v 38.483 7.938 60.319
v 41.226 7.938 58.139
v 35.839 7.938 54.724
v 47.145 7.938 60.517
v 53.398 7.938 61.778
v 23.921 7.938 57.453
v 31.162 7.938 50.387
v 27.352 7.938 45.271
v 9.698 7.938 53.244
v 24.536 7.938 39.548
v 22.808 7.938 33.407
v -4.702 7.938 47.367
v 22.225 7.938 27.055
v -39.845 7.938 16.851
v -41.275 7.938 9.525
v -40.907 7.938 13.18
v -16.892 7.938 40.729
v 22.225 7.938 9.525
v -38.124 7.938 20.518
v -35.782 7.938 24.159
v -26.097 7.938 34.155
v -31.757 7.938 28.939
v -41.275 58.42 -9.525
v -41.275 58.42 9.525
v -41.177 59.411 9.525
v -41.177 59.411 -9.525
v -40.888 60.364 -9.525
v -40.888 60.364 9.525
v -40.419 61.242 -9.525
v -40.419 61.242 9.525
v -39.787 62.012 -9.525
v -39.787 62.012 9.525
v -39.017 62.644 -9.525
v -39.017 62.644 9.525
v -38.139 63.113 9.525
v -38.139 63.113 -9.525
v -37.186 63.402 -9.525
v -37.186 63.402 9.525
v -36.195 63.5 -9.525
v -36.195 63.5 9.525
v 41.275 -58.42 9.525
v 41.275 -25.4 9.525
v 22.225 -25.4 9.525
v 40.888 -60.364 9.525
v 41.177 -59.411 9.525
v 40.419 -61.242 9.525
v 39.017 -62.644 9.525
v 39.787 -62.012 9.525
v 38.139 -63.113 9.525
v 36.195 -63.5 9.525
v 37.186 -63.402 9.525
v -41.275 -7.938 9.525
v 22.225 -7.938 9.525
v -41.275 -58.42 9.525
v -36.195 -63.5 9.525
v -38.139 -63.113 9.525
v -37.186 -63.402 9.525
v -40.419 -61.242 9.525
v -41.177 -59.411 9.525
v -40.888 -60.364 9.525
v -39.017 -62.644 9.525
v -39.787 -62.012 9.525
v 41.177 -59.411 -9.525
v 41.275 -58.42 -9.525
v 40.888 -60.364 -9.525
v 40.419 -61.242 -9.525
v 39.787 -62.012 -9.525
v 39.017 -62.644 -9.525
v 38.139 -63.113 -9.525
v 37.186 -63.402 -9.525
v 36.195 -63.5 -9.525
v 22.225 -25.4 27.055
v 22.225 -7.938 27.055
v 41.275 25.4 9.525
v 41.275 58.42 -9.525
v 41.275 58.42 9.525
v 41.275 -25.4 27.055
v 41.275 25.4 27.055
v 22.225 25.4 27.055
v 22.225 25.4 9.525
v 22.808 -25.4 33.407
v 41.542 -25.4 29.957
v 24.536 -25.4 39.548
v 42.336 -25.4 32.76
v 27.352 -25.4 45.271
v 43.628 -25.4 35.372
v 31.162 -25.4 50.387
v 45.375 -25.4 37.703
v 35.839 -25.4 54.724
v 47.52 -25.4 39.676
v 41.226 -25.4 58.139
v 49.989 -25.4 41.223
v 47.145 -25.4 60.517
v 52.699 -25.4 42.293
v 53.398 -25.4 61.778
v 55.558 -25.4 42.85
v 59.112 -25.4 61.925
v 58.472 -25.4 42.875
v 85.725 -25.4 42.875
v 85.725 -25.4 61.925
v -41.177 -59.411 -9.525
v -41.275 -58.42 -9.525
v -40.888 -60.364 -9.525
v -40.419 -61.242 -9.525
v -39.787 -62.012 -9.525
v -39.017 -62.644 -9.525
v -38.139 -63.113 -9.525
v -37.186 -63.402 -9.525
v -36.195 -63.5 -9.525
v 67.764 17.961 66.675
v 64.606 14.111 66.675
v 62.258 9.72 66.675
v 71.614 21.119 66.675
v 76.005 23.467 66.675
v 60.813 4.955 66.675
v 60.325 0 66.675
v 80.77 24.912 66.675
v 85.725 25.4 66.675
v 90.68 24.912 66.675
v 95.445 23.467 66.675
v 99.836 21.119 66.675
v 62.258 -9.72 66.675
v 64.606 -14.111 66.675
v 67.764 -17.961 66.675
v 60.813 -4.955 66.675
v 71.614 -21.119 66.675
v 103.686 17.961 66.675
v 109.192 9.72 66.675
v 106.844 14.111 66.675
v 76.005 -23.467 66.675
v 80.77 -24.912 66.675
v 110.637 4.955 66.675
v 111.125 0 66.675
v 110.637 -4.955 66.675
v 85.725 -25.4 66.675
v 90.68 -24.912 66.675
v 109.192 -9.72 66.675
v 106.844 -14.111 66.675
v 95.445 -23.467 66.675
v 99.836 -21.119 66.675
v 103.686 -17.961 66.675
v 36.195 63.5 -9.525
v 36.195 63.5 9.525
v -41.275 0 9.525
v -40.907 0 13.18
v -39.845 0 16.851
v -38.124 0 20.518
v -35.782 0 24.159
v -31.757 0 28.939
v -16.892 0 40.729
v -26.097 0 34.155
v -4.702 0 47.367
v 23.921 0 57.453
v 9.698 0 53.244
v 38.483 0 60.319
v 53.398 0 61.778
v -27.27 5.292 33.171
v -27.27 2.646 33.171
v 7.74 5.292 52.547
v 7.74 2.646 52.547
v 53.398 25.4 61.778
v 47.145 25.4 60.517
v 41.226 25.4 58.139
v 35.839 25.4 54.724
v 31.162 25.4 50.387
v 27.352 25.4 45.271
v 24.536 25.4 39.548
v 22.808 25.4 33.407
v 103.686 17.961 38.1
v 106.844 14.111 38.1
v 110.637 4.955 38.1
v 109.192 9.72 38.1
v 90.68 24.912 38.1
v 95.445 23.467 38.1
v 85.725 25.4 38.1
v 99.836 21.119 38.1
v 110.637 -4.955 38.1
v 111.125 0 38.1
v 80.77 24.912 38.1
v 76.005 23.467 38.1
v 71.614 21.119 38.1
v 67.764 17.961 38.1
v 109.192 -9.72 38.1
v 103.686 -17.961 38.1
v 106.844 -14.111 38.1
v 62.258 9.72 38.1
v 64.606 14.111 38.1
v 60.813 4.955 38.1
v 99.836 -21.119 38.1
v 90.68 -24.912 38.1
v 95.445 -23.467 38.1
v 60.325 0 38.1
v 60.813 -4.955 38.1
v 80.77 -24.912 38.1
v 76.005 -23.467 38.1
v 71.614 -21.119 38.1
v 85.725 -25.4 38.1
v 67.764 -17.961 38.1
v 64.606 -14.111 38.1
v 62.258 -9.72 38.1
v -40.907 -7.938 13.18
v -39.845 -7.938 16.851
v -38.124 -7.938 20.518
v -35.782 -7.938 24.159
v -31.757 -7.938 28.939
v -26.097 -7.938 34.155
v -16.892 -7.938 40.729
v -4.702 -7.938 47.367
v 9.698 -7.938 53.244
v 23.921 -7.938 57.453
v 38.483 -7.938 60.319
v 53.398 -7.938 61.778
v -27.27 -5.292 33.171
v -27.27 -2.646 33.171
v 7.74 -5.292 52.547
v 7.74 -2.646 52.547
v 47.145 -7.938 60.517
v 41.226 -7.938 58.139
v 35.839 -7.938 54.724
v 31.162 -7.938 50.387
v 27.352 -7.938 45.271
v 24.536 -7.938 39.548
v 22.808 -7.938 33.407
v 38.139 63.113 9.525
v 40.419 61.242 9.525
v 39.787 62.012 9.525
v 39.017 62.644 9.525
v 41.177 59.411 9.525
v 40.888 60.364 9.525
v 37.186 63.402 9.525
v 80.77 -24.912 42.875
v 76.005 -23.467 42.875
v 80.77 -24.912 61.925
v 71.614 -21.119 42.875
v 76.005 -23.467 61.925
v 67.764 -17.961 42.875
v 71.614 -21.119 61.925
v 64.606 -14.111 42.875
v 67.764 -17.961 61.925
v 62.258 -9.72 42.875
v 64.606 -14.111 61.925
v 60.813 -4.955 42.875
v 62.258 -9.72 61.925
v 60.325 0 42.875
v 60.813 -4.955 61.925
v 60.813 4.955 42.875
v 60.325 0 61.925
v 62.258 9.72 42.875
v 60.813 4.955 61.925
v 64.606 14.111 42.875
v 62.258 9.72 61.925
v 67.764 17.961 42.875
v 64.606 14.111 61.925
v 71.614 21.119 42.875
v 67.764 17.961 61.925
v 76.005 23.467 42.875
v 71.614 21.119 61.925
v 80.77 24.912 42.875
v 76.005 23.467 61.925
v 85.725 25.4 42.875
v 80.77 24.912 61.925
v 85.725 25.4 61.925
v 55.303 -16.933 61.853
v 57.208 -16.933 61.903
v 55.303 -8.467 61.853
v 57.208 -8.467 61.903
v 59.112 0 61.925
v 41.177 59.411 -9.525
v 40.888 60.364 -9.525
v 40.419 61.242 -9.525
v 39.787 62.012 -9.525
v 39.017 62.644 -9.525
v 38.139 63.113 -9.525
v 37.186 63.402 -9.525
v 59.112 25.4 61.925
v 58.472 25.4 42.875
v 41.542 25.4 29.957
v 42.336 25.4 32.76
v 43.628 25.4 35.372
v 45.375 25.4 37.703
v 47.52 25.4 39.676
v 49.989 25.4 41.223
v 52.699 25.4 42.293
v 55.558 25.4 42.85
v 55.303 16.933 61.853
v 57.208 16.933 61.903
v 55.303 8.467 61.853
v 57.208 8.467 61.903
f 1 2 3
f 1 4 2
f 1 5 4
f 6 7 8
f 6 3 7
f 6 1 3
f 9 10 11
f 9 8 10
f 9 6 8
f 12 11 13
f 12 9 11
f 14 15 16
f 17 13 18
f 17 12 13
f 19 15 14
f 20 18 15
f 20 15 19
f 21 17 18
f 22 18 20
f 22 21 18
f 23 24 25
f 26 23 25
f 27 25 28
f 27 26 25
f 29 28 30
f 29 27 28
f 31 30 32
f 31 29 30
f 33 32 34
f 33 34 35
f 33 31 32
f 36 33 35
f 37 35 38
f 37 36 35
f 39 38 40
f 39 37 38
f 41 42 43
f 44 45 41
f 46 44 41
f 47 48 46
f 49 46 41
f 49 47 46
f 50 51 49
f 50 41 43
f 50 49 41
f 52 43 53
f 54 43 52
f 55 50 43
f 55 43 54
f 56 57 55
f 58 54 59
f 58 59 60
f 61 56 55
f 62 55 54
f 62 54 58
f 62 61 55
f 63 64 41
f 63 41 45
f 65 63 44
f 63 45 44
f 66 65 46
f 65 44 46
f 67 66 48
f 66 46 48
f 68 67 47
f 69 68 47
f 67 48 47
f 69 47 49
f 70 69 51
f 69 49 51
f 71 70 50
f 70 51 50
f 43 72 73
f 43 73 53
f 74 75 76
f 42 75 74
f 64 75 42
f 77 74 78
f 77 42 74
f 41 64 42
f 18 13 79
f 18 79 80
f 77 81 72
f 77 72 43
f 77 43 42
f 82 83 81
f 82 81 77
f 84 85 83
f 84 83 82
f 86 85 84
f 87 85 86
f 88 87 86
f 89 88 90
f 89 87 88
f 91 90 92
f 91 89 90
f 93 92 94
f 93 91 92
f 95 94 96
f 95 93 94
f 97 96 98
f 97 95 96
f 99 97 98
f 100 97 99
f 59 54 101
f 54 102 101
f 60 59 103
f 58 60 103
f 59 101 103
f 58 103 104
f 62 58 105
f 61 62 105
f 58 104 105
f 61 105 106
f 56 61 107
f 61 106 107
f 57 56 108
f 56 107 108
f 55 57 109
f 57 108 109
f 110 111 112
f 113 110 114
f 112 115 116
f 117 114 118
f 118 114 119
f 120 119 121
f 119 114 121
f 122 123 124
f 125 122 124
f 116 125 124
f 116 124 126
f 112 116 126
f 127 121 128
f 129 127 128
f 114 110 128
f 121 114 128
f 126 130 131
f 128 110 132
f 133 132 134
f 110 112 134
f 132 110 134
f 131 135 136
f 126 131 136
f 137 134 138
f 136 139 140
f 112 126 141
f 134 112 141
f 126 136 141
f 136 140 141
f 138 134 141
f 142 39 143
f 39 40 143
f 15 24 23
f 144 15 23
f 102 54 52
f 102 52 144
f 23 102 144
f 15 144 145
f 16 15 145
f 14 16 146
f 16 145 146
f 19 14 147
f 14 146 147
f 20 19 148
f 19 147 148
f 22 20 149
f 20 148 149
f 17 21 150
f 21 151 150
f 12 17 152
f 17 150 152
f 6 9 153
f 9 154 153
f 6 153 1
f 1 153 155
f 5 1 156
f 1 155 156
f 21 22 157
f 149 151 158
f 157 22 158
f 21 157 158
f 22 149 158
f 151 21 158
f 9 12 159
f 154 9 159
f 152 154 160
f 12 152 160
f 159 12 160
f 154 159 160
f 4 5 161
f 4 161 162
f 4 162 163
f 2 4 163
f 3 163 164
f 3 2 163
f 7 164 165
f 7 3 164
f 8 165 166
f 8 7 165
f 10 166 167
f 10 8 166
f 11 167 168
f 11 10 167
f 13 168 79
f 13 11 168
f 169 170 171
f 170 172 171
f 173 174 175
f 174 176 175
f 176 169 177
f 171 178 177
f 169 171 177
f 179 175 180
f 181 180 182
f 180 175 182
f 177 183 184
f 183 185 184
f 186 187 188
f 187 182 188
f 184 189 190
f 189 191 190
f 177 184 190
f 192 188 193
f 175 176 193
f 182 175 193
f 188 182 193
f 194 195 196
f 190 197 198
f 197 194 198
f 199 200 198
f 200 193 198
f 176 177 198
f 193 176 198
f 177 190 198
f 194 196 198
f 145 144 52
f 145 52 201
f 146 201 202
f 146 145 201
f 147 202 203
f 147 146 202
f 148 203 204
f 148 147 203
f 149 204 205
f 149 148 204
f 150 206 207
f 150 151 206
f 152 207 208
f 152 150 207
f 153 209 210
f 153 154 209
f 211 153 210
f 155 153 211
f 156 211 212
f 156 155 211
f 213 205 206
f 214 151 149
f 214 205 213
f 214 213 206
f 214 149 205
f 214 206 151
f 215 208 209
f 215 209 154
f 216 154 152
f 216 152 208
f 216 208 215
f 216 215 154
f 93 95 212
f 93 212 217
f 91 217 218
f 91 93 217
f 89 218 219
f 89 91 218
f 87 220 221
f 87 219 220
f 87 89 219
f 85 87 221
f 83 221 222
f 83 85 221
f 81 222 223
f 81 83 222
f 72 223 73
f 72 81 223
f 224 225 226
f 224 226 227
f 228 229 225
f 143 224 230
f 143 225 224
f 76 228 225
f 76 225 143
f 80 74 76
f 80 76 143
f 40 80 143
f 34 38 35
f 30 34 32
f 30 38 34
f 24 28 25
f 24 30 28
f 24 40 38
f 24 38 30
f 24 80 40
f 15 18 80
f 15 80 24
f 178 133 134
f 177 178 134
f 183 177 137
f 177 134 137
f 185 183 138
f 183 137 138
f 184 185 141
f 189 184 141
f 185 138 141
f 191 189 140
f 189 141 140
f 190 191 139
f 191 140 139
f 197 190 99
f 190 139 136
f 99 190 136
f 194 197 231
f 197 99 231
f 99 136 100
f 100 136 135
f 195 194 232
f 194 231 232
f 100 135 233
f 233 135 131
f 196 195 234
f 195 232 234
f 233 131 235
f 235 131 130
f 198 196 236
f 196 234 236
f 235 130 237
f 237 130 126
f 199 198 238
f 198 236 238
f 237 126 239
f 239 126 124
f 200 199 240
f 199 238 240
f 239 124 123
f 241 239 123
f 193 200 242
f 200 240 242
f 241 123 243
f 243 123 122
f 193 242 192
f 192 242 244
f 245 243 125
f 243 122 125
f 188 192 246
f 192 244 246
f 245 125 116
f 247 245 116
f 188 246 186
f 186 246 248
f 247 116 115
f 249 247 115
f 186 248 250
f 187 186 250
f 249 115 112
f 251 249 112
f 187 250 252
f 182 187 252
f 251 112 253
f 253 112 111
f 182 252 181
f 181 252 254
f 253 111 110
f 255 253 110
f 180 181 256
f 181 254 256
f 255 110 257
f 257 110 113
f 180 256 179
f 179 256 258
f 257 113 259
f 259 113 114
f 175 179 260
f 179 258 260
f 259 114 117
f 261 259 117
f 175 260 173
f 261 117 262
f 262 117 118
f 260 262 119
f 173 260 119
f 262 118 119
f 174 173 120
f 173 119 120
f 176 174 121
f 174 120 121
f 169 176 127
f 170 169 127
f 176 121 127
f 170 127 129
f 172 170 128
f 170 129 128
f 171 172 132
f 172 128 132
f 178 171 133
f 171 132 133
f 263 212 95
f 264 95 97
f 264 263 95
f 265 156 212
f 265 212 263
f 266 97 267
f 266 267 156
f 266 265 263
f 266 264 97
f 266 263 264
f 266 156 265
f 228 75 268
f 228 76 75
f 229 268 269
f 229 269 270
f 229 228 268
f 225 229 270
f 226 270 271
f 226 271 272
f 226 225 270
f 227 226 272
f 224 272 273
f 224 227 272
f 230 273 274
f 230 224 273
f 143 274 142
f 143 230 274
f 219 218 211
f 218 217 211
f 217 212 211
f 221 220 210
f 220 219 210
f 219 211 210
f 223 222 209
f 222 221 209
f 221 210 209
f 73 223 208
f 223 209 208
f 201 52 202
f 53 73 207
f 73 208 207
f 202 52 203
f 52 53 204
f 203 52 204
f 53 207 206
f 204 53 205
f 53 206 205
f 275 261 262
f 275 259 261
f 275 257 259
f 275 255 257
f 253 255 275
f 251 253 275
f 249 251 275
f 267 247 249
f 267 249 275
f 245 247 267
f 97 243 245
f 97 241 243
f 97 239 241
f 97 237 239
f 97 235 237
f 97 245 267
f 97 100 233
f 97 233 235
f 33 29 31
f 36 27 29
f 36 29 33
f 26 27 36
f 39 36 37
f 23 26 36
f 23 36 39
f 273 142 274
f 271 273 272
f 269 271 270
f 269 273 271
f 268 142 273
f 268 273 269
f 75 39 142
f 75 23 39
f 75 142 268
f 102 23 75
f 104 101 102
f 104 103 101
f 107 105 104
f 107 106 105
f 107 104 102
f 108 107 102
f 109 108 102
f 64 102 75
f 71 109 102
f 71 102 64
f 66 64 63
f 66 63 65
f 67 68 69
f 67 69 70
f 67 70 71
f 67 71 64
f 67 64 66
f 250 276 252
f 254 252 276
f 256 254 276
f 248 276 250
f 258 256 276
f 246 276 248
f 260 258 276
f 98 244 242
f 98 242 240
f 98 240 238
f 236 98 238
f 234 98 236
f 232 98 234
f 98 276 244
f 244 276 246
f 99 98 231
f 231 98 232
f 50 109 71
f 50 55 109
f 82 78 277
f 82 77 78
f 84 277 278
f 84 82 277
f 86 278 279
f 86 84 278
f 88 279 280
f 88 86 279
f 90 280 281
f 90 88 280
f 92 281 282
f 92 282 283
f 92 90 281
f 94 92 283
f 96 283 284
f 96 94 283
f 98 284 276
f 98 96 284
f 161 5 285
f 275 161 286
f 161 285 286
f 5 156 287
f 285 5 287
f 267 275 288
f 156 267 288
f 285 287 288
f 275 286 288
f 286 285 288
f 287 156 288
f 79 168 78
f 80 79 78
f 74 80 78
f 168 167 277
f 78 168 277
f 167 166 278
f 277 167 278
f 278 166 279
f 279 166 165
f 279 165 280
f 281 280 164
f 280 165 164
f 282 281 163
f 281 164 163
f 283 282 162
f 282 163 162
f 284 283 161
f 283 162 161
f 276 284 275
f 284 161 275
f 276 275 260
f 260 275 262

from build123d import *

# Parameters (mm, degrees)
F1_DEPTH = 63.5
F2_DEPTH = 25.4
F3_DEPTH = 7.9375
F5_R     = 5.08


with BuildPart() as f1:
    # F0 (on Front) → F1 (new body, symmetric)
    with BuildSketch(Plane.XZ):
        Polygon((22.225, 9.525), (-41.275, 9.525), (-41.275, -9.525), (41.275, -9.525), (41.275, 9.525), align=None)
    extrude(amount=F1_DEPTH, both=True)

    # F0 (on Front) → F2 (join, symmetric)
    with BuildSketch(Plane.XZ):
        Polygon((83.458367, 61.9252), (60.325, 61.9252), (60.325, 42.8752), (83.458367, 42.8752), (85.725, 42.8752), (85.725, 61.9252), align=None)
        with BuildLine():
            Line((22.225, 27.055343), (22.225, 9.525))
            Line((22.225, 9.525), (41.275, 9.525))
            Line((41.275, 9.525), (41.275, 27.055343))
            ThreePointArc((41.275, 27.055343), (46.402245, 38.738724), (58.472026, 42.8752))
            Line((58.472026, 42.8752), (60.325, 42.8752))
            Line((60.325, 42.8752), (60.325, 61.9252))
            Line((60.325, 61.9252), (59.111812, 61.9252))
            add(Edge.make_bspline(
                [(53.39808, 61.778228), (55.302948, 61.866382), (57.208525, 61.91594), (59.111812, 61.9252)],
                knots=[108.876649, 108.876649, 108.876649, 108.876649, 113.239979, 113.239979, 113.239979, 113.239979], degree=3))
            ThreePointArc((53.39808, 61.778228), (31.161623, 50.386865), (22.225, 27.055343))
        make_face()
    extrude(amount=F2_DEPTH, both=True)

    # F0 (on Front) → F3 (join, symmetric)
    with BuildSketch(Plane.XZ):
        with BuildLine():
            add(Edge.make_bspline(
                [(-41.275, 9.525), (-41.223468, 33.347389), (5.866576, 59.578541), (53.39808, 61.778228)],
                knots=[0, 0, 0, 0, 108.876649, 108.876649, 108.876649, 108.876649], degree=3))
            Line((-41.275, 9.525), (22.225, 9.525))
            Line((22.225, 9.525), (22.225, 27.055343))
            ThreePointArc((22.225, 27.055343), (31.161623, 50.386865), (53.39808, 61.778228))
        make_face()
    extrude(amount=F3_DEPTH, both=True)

    # F0 (on Front) → F4 (revolve)
    with BuildSketch(Plane.XZ):
        Polygon((111.125, 66.675), (85.725, 66.675), (85.725, 61.9252), (85.725, 42.8752), (85.725, 38.1), (111.125, 38.1), align=None)
    revolve(axis=Axis((85.725, 0, 52.3875), (0, 0, -1)))

    # F5
    f5_edges = [f1.edges().sort_by_distance(p)[0] for p in [
        (41.275, -63.5, 0),
        (-41.275, -63.5, 0),
        (-41.275, 63.5, 0),
        (41.275, 63.5, 0),
    ]]
    fillet(f5_edges, radius=F5_R)


solid = f1.part
